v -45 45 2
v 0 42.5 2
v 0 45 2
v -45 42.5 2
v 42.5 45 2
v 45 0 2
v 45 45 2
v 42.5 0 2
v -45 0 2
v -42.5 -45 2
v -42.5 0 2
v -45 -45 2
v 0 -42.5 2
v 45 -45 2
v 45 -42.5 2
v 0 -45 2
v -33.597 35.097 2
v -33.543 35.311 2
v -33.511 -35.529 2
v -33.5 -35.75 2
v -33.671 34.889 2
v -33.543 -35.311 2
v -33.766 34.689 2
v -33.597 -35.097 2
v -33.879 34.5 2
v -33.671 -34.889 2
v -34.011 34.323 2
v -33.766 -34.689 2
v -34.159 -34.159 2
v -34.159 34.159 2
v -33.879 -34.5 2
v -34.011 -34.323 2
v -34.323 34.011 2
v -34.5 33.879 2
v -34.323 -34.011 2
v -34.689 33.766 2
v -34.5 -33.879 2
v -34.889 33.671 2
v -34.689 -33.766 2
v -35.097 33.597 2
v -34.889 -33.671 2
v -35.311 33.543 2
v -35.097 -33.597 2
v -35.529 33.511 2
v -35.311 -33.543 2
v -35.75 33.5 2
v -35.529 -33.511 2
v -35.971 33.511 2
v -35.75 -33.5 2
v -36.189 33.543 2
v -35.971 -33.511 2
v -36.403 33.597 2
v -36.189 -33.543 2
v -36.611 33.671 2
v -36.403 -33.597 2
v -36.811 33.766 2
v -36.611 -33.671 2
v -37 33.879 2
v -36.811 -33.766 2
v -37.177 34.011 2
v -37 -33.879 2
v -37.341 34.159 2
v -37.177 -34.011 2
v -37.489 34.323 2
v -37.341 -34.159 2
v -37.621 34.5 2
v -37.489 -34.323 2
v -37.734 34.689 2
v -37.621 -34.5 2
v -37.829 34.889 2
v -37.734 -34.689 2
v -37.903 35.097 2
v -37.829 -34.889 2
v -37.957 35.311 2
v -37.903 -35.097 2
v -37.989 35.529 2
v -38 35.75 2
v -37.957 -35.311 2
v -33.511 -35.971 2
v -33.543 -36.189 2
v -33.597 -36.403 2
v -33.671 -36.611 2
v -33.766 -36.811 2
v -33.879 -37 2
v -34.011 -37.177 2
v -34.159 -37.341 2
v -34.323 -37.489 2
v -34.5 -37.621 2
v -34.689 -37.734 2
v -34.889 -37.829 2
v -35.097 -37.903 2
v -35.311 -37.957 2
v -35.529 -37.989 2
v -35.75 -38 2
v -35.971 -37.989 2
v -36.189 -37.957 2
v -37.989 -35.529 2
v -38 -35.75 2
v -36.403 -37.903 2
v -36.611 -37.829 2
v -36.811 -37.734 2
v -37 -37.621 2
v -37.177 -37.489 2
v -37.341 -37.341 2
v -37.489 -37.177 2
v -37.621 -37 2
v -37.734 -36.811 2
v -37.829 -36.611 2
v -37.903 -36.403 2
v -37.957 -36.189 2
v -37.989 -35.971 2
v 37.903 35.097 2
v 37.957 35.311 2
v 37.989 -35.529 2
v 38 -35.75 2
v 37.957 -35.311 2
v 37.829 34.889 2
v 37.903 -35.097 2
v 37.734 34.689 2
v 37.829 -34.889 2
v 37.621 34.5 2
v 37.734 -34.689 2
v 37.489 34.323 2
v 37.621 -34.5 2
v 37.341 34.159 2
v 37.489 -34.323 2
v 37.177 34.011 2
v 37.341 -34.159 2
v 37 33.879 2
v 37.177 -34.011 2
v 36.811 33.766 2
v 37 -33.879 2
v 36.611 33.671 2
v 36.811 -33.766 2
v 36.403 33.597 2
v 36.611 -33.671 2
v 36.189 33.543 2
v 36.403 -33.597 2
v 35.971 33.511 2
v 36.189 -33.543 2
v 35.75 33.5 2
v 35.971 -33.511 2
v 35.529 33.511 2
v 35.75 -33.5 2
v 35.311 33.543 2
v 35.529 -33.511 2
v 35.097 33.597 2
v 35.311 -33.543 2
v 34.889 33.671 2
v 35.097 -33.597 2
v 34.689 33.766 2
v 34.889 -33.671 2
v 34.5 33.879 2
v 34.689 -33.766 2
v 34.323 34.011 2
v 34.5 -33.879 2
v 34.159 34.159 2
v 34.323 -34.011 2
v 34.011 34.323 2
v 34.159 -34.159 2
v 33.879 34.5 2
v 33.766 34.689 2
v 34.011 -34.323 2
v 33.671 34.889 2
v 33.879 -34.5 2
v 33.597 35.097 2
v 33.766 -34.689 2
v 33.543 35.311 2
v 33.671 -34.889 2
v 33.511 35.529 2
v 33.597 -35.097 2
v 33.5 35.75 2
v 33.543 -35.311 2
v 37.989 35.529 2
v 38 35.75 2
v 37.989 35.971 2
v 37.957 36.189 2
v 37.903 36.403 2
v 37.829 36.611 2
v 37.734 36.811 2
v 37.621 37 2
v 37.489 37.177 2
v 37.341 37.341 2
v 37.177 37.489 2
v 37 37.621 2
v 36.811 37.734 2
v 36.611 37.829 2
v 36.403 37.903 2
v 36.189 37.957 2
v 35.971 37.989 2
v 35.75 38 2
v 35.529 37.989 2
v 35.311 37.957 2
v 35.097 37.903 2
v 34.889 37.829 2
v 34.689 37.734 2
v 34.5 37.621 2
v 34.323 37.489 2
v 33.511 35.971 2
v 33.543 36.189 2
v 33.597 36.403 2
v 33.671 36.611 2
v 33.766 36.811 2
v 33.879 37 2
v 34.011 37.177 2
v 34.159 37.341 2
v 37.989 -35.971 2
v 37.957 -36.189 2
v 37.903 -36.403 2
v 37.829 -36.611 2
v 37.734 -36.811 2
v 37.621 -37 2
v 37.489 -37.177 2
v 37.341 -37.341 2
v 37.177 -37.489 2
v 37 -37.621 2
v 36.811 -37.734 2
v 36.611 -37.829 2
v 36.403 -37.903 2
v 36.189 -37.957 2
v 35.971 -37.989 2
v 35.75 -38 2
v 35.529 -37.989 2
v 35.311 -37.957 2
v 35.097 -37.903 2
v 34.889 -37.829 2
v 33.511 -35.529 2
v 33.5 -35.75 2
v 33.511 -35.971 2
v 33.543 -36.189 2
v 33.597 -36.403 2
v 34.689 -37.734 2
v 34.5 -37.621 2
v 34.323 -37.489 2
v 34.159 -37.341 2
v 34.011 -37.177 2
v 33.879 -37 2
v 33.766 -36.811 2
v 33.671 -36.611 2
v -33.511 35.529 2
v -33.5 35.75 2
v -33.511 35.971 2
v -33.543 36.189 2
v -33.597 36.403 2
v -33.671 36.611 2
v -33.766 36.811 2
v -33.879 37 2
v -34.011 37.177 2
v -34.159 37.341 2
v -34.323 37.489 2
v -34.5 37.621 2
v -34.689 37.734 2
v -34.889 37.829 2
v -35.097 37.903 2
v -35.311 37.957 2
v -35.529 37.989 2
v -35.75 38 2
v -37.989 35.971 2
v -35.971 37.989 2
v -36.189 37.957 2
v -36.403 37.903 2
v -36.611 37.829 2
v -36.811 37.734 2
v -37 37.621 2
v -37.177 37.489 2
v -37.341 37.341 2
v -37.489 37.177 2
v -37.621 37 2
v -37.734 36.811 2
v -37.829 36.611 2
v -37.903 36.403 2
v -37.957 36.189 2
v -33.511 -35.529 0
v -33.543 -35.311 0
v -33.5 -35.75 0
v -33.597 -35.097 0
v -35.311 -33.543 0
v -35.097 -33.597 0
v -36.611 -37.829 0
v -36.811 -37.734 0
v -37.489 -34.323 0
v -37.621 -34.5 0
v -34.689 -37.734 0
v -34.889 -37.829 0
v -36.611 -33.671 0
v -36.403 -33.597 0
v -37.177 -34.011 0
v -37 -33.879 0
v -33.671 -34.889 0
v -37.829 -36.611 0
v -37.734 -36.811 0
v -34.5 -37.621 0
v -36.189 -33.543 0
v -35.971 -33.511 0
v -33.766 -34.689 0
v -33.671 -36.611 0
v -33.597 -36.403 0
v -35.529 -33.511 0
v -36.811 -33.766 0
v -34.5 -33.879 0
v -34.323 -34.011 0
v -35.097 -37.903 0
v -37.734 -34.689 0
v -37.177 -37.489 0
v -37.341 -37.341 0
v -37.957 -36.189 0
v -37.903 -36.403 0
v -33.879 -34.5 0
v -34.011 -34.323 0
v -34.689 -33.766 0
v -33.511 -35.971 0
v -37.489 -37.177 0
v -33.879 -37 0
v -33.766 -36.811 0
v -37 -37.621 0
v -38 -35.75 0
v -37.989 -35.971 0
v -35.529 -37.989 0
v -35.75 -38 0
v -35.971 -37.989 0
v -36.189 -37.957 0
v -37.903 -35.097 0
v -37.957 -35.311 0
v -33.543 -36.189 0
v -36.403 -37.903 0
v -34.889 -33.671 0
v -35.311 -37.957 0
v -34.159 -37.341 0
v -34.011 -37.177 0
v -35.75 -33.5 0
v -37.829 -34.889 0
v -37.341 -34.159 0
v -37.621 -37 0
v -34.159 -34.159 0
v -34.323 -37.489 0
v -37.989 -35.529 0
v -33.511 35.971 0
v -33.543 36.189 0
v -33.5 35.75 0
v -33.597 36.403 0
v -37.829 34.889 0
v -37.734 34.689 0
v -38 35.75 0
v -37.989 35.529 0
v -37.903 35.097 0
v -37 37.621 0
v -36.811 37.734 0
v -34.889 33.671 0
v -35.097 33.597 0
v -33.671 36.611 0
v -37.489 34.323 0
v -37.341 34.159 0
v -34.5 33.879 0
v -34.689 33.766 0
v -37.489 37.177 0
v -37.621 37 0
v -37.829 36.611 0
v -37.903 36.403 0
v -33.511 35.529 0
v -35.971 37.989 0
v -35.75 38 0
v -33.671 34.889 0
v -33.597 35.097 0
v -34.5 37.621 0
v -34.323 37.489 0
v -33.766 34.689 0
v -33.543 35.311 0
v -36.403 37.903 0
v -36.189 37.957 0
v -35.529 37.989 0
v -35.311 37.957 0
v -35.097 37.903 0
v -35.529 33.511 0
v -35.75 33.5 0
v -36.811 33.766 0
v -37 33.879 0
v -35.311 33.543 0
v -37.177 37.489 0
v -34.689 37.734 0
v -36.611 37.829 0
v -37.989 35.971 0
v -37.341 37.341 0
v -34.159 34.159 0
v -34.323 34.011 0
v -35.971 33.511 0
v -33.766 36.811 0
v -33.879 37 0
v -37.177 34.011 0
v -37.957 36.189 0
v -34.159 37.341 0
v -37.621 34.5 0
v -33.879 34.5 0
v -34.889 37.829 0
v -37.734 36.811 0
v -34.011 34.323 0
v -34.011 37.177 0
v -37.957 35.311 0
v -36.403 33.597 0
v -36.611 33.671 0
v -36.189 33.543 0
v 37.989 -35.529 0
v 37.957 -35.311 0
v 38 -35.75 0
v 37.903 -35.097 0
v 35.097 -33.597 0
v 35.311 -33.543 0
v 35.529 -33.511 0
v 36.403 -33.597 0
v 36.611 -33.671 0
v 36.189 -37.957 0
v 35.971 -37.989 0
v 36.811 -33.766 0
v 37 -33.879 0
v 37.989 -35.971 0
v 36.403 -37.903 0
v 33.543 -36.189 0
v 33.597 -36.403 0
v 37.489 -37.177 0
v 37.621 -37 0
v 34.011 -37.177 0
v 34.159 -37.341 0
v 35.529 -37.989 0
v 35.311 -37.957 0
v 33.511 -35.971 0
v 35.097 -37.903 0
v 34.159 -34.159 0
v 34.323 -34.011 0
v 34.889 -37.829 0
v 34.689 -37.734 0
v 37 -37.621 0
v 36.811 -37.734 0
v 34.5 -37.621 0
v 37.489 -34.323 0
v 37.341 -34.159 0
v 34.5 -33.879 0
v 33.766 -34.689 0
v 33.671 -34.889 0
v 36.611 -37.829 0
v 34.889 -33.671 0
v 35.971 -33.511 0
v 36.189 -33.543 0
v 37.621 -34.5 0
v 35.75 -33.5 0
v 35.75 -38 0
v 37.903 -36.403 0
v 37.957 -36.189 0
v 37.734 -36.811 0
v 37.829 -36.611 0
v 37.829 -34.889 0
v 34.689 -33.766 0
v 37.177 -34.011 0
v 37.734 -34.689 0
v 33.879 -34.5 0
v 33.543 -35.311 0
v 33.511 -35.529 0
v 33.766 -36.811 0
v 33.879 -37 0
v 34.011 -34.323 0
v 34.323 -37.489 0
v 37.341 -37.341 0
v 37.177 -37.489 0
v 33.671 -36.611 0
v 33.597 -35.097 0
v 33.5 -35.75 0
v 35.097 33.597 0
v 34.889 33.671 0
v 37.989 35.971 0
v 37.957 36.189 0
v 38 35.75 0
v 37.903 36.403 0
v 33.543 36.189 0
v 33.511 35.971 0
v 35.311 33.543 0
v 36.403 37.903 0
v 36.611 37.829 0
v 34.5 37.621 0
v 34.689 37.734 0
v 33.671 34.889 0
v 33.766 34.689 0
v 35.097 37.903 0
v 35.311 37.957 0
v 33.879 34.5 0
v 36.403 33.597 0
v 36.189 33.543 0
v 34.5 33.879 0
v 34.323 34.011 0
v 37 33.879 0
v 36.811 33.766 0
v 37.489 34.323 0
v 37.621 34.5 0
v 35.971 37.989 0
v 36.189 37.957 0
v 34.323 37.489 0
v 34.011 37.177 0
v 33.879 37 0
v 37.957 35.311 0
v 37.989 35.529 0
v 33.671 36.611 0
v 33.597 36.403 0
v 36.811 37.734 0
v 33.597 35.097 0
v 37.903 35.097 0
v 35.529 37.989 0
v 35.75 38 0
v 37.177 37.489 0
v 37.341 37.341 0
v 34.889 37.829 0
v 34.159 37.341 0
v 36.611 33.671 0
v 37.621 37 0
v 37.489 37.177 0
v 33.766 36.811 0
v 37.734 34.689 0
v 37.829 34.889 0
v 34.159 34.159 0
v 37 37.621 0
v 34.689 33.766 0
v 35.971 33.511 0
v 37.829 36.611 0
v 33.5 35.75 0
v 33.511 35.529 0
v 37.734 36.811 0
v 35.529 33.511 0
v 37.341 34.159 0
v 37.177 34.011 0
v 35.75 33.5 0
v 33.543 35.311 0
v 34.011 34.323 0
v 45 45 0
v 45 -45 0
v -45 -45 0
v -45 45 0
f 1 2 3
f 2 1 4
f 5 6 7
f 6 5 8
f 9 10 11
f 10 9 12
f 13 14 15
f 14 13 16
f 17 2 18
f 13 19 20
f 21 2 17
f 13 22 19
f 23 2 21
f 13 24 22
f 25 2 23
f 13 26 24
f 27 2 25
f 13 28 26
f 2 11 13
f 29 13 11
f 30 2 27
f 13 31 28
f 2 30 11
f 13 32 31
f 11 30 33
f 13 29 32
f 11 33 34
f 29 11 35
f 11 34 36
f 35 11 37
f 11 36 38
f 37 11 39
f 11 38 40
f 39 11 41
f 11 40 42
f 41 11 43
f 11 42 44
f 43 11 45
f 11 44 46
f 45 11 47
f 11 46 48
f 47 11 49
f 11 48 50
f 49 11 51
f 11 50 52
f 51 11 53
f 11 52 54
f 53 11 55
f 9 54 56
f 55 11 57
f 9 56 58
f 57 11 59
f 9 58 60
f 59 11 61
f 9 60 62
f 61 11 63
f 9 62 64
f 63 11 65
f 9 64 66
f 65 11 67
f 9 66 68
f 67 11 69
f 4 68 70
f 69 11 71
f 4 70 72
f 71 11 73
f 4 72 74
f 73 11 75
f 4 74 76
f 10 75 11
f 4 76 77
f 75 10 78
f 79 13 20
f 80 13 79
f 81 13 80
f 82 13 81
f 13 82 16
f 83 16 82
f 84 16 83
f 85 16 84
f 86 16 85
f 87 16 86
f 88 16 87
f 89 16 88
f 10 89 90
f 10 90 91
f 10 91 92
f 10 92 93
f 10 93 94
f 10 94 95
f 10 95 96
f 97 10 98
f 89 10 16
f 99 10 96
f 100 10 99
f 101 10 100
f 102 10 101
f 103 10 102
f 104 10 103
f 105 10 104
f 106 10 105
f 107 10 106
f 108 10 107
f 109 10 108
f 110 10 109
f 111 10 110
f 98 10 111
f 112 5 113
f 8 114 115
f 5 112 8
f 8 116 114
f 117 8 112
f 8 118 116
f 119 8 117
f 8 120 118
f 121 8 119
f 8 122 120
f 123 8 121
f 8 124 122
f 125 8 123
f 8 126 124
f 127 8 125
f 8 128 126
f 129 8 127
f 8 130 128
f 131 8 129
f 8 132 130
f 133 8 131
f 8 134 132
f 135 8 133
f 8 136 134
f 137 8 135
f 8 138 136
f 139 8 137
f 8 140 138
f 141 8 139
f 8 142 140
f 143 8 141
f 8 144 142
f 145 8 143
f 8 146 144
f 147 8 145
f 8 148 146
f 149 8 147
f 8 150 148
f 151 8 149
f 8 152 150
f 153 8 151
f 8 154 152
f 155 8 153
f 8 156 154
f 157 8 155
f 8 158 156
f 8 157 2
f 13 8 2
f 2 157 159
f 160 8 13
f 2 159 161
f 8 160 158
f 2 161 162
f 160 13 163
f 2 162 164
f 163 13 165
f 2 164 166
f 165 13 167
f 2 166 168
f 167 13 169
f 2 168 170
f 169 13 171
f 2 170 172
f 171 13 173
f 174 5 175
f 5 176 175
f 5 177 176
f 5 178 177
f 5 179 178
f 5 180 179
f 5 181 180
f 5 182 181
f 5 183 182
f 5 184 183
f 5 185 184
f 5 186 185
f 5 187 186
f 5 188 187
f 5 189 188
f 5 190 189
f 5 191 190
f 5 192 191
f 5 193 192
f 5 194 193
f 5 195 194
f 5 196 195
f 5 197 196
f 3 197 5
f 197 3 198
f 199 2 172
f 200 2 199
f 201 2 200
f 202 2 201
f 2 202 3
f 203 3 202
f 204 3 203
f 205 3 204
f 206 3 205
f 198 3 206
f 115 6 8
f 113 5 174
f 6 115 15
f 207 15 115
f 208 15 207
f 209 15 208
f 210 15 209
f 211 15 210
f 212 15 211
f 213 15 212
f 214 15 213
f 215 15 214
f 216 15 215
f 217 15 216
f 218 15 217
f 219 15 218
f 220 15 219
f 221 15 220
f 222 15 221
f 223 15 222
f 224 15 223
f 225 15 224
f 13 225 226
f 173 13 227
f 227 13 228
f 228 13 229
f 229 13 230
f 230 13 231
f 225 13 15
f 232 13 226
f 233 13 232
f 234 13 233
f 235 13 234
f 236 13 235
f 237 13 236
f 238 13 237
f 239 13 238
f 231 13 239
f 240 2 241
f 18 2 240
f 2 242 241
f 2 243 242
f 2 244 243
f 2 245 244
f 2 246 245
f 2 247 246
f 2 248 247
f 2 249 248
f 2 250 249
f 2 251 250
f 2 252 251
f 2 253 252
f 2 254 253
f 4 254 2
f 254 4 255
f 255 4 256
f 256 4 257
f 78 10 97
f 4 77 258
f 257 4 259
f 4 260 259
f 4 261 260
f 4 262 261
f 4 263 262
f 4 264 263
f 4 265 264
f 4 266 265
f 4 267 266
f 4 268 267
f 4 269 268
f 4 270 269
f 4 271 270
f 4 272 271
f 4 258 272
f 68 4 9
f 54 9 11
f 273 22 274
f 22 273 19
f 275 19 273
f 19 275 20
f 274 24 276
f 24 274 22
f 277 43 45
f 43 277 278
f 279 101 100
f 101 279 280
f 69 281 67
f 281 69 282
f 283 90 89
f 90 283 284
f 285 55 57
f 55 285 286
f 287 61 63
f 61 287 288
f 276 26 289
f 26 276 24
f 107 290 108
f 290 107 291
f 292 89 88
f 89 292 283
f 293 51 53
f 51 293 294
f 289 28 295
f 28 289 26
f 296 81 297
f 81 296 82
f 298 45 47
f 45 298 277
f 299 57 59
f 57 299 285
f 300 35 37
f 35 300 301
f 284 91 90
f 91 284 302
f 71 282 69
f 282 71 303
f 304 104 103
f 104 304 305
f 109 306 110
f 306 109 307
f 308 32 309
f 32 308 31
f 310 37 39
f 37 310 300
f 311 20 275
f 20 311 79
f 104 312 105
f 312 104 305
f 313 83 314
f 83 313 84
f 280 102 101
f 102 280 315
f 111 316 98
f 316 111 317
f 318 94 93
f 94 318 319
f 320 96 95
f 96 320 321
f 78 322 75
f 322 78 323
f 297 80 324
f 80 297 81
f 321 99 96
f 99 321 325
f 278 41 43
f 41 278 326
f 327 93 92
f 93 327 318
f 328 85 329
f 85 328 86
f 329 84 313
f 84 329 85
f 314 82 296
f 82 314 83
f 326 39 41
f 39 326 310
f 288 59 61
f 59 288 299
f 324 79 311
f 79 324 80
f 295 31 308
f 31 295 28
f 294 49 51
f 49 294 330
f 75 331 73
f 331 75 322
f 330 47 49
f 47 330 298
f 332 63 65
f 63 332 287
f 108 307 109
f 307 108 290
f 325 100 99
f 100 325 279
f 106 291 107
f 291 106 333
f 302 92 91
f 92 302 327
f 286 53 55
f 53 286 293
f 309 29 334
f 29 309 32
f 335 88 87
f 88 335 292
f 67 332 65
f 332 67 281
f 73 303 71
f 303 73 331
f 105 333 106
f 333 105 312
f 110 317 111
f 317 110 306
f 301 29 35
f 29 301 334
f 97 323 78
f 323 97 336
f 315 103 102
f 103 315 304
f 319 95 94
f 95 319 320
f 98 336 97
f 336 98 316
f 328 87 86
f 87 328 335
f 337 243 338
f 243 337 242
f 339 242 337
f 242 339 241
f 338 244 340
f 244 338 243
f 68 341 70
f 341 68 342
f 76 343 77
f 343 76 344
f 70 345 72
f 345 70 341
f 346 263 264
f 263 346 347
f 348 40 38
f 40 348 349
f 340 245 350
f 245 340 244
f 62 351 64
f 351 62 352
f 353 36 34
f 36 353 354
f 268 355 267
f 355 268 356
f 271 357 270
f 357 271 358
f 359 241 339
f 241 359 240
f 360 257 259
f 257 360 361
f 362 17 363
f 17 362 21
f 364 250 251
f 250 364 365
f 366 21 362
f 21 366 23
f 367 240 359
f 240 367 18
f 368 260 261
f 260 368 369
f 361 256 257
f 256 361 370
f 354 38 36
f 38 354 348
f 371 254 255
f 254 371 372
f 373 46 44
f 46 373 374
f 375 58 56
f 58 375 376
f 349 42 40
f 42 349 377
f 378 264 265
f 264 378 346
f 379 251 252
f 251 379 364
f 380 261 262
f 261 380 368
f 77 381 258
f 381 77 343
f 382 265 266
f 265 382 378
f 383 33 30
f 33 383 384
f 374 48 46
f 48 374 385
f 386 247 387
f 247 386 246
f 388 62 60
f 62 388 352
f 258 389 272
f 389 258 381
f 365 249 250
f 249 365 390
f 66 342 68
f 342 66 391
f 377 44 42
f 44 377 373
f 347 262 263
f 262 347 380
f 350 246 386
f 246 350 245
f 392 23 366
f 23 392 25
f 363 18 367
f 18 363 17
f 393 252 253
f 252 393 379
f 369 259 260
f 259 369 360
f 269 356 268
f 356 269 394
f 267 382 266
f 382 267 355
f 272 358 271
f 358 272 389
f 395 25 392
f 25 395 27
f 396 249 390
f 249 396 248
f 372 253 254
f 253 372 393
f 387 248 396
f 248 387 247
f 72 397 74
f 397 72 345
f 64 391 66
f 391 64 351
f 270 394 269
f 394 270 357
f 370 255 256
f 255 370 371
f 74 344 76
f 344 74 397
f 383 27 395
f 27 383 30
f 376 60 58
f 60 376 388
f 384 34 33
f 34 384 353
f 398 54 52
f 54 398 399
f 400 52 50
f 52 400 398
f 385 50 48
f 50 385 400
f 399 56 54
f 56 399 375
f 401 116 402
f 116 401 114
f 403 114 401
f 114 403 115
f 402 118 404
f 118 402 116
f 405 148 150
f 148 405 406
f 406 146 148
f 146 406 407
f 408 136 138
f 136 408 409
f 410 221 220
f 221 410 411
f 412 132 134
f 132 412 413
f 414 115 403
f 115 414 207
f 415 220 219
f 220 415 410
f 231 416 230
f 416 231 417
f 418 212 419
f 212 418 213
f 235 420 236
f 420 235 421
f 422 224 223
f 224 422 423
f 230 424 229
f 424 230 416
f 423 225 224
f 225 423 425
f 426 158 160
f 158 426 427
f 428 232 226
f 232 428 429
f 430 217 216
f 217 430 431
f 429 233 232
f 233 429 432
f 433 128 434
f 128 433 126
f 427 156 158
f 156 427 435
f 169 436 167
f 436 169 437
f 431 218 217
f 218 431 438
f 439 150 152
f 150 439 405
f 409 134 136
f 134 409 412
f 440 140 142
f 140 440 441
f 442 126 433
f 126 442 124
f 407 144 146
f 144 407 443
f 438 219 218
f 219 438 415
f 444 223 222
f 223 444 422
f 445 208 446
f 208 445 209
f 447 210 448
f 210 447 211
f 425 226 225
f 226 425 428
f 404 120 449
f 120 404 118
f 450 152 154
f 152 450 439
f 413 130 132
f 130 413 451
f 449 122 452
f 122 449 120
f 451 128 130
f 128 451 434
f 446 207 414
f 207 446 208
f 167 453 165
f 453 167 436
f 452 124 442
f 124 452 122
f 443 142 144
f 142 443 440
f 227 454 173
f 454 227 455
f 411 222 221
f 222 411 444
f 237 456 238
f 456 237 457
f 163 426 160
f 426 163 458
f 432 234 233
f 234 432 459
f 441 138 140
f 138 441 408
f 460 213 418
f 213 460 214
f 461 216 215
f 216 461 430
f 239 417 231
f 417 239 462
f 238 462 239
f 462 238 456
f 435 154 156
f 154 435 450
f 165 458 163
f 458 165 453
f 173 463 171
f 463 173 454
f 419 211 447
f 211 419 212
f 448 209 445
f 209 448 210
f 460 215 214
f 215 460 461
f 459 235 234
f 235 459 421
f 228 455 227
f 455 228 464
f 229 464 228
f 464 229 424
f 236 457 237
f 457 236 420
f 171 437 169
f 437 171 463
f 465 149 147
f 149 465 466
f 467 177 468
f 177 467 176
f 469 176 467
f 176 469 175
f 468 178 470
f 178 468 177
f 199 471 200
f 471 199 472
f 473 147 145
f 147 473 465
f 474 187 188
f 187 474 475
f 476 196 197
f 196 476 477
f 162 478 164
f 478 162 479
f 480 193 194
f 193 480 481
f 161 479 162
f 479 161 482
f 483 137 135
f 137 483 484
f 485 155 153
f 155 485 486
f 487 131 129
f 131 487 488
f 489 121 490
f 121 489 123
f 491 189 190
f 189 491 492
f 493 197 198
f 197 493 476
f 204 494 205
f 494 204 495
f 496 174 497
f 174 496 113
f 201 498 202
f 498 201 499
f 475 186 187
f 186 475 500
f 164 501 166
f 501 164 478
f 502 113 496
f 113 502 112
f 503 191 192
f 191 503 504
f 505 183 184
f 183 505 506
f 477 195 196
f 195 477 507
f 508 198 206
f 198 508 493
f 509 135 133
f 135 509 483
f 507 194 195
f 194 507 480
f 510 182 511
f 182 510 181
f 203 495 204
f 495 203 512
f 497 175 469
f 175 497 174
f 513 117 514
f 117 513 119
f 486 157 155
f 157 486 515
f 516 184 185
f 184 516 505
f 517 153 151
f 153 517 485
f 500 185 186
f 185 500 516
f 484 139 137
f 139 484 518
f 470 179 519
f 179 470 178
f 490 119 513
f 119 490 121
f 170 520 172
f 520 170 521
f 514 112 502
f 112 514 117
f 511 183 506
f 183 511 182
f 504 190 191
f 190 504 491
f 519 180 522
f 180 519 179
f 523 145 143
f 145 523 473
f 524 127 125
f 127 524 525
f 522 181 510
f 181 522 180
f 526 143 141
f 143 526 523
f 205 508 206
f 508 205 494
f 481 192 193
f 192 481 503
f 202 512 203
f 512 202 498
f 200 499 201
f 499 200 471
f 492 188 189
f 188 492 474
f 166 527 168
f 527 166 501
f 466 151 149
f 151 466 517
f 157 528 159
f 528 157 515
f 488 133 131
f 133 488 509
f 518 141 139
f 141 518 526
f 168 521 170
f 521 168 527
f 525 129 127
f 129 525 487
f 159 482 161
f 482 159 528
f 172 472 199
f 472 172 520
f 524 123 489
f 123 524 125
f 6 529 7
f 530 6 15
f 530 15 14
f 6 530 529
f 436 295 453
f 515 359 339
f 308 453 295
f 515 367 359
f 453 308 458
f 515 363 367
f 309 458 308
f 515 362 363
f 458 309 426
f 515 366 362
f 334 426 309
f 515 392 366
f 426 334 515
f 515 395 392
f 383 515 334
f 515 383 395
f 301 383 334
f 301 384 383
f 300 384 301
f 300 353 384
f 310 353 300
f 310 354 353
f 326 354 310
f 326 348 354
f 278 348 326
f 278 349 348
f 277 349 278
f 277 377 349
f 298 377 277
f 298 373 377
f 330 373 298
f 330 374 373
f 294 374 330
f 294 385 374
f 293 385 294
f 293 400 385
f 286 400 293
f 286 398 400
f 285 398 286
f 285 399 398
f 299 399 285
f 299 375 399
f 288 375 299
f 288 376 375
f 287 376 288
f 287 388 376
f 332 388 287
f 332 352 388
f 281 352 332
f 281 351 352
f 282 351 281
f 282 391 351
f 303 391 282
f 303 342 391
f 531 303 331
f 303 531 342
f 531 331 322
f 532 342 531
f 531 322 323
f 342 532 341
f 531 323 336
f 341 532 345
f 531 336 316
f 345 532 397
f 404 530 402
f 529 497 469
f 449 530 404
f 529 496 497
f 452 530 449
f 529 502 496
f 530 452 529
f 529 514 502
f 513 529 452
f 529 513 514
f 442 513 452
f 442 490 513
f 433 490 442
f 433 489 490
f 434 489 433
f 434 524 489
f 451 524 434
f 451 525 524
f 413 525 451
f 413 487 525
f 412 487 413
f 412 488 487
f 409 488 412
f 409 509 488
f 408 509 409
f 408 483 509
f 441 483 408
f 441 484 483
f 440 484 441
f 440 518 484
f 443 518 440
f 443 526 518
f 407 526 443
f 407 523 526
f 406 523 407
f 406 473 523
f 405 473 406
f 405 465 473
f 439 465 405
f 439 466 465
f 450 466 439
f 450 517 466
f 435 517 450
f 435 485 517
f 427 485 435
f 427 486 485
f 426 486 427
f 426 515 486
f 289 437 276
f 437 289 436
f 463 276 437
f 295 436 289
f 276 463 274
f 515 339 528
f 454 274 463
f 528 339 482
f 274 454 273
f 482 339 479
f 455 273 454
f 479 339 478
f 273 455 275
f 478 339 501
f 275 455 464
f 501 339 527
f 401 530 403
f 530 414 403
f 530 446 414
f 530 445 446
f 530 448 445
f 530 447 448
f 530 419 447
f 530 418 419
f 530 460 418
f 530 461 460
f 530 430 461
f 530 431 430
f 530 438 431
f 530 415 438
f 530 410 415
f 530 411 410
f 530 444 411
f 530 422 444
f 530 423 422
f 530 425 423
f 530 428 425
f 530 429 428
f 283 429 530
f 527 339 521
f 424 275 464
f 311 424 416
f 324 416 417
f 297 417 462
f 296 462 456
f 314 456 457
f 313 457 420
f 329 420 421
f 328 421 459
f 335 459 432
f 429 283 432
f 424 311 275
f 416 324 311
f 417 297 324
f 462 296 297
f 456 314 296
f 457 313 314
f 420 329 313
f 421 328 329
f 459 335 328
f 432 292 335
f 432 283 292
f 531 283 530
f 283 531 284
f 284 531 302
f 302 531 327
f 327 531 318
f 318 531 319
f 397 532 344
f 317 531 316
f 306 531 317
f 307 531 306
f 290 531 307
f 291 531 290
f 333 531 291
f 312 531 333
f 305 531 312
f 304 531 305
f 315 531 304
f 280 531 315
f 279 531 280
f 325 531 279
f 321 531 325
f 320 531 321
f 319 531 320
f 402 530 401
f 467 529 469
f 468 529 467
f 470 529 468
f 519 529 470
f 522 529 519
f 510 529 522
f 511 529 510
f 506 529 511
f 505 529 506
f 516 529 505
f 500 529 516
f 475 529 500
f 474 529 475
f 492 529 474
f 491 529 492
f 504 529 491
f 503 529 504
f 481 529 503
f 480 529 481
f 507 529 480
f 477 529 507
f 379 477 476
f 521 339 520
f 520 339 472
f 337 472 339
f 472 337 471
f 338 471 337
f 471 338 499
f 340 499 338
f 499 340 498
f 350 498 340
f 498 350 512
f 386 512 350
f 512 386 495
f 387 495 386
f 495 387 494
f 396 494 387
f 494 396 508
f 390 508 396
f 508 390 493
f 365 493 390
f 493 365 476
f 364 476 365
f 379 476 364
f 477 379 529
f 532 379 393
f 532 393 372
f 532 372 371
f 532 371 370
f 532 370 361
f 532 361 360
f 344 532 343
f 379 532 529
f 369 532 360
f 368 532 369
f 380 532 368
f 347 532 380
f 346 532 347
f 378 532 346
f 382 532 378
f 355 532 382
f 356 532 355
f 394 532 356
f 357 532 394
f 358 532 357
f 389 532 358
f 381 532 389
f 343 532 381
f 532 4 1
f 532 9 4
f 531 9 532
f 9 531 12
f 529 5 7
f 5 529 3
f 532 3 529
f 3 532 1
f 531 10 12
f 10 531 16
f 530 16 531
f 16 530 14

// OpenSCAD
// Magnetic stirrer housing - upside-down open box
// Print orientation: top plate on bed (z = 0), walls rise to open top (z = 40)

// ---------- Parameters ----------
plate_t      = 2;     // top plate thickness
wall_t       = 2.5;   // wall thickness
box_h        = 40;    // overall height
outer_w      = 90;    // outer size in X and Y
screw_holes  = 4;     // M4 screw holes in top plate
screw_pitch  = 71.5;  // square pattern pitch for screw holes
notch_w      = 12;    // cable notch width
notch_d      = 8;     // cable notch depth from open edge
eps          = 0.5;   // overcut for clean differences

$fn = 64;

// ---------- Model ----------
difference() {
    // Top plate (now at bottom)
    translate([-outer_w/2, -outer_w/2, 0])
        cube([outer_w, outer_w, plate_t]);

    // Four walls, open top
    for (a = [0, 90, 180, 270])
        rotate([0, 0, a])
            translate([0, -outer_w/2, plate_t])
                cube([outer_w, wall_t, box_h - plate_t]);

    // Screw holes through top plate
    for (i = [-1, 1])
        for (j = [-1, 1])
            translate([i * screw_pitch/2, j * screw_pitch/2, -eps])
                cylinder(d = 4.5, h = plate_t + 2*eps);

    // Cable notch in one wall (cut from open edge)
    translate([-outer_w/2 + (outer_w - notch_w)/2,
               -outer_w/2 - eps,
               box_h - notch_d])
        cube([notch_w, wall_t + 2*eps, notch_d + eps]);
}
